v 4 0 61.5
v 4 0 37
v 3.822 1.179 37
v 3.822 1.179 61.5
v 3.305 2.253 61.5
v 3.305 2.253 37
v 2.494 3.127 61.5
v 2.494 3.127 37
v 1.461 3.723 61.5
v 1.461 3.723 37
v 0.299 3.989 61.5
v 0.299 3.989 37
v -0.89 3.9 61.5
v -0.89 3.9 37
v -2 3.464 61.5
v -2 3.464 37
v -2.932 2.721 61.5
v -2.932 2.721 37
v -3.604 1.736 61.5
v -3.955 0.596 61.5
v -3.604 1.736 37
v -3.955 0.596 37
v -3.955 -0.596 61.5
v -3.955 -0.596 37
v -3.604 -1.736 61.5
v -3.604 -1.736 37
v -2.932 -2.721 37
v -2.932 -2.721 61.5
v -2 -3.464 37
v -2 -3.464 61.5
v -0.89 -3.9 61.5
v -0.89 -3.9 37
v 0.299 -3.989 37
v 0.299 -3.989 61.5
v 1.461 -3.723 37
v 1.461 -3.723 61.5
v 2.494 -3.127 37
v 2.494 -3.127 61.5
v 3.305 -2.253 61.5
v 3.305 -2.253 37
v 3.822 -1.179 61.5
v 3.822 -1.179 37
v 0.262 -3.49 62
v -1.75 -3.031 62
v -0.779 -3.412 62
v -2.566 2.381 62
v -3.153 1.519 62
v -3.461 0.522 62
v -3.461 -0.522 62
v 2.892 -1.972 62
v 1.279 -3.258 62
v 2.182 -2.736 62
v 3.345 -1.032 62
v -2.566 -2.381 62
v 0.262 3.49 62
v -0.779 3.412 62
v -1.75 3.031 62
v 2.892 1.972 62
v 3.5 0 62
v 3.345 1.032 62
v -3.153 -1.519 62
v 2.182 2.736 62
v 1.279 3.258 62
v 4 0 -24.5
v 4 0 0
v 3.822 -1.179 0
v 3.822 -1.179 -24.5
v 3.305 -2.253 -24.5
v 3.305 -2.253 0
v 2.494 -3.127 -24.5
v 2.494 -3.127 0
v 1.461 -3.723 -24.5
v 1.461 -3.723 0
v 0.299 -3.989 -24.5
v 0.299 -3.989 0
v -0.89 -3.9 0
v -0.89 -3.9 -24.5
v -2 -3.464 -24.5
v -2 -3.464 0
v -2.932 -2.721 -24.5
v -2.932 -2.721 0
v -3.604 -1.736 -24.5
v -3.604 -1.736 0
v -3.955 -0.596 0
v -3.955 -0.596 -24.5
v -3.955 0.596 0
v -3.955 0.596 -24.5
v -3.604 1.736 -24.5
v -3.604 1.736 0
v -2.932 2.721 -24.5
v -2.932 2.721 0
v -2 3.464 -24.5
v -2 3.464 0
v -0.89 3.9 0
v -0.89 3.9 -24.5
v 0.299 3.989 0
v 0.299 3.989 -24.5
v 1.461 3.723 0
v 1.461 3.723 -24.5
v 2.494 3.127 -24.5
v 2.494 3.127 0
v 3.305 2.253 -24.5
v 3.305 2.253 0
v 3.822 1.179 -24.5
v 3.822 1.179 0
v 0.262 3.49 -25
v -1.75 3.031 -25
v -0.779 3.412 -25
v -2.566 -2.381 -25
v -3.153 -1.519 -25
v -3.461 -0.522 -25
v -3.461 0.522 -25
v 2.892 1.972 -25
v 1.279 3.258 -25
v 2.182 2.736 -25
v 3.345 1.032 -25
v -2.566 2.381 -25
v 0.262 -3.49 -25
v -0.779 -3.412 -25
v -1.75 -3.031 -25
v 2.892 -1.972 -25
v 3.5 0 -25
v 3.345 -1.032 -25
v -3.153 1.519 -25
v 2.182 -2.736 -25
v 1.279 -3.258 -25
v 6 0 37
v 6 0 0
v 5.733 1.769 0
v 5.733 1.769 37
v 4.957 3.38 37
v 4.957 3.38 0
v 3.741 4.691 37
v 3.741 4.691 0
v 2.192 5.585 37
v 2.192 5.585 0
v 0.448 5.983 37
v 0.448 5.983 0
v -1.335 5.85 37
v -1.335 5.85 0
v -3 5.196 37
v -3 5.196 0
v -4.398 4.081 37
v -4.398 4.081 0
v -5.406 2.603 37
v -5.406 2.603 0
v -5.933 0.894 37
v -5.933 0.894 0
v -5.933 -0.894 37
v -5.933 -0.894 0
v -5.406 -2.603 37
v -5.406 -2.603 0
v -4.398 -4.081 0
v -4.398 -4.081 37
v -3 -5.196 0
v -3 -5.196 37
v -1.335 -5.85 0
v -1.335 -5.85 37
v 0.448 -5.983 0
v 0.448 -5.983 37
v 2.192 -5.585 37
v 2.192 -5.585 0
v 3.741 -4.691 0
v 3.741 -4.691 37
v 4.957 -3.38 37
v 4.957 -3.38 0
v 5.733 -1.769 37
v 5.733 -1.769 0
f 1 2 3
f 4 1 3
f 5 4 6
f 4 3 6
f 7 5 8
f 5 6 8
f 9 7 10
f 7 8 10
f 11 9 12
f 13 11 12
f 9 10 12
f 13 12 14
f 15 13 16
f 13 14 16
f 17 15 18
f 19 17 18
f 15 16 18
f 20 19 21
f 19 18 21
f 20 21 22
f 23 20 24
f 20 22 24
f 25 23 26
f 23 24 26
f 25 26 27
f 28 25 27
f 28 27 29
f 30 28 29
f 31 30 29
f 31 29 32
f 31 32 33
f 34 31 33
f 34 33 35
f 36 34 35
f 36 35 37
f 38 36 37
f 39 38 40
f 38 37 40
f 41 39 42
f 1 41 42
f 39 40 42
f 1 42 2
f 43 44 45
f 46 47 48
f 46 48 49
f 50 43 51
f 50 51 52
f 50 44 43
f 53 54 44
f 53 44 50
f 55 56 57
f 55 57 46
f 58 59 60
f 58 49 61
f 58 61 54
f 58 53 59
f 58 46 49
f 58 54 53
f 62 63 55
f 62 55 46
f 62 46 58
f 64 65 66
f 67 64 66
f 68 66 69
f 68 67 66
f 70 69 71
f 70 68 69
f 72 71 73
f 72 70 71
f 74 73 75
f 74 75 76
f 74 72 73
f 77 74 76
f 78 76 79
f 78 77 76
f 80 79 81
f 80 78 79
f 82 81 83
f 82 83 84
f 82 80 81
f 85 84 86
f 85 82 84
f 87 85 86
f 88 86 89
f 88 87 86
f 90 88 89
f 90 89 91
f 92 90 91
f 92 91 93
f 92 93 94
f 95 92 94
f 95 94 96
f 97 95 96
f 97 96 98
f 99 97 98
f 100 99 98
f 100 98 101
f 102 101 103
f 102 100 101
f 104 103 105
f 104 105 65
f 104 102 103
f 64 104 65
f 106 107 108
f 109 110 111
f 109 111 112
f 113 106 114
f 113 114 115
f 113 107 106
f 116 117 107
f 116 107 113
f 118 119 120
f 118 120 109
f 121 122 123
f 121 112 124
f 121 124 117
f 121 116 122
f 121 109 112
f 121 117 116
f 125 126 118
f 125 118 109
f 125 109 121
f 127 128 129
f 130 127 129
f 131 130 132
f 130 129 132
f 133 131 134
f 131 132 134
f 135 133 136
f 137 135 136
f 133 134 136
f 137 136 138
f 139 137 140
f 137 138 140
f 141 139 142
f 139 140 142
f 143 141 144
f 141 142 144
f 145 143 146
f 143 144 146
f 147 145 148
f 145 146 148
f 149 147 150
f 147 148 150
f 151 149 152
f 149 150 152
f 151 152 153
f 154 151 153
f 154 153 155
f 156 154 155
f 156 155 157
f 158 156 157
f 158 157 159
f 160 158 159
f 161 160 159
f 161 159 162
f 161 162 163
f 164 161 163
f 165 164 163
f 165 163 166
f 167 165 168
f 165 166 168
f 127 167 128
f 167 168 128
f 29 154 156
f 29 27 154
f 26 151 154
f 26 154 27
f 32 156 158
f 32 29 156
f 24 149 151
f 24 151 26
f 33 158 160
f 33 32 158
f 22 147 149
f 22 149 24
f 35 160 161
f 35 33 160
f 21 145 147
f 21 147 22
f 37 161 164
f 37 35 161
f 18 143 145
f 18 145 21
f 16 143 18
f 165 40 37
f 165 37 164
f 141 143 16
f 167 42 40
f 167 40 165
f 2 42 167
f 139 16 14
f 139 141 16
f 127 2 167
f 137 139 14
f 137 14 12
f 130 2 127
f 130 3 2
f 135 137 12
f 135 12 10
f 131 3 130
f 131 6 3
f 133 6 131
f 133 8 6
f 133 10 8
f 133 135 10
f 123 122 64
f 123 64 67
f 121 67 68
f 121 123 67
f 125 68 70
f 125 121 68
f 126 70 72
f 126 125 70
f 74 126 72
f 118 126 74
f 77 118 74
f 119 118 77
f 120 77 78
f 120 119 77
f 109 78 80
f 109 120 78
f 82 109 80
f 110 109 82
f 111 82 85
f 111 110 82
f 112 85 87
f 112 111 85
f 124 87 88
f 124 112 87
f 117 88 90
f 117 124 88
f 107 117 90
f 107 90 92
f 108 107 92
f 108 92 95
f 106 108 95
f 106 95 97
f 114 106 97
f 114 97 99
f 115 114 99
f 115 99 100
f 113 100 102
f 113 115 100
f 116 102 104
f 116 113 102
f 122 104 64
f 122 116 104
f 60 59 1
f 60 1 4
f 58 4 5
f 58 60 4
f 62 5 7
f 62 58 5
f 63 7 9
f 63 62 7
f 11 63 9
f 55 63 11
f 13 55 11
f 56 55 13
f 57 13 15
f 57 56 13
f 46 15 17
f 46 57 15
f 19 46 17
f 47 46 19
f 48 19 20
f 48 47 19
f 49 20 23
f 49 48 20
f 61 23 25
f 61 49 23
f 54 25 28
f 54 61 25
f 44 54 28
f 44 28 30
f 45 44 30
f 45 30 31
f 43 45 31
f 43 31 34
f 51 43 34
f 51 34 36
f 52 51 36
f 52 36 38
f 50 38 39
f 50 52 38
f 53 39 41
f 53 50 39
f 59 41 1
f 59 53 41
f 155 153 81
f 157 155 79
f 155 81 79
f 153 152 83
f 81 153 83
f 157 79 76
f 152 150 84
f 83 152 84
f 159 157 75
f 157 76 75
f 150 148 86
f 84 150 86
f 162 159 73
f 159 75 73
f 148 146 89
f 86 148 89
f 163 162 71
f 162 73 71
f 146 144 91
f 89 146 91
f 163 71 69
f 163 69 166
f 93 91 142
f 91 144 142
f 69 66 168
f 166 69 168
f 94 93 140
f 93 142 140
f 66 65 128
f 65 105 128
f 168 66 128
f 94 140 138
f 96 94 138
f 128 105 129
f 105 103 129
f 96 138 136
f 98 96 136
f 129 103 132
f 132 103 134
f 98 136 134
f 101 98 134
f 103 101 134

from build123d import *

# Parameters (mm, degrees)
SCHIZZO1_R        = 6
ESTRUSIONE1_DEPTH = 37
SCHIZZO3_R        = 4
ESTRUSIONE2_DEPTH = 25
ESTRUSIONE3_START = 25
SCHIZZO4_R        = 4
ESTRUSIONE3_DEPTH = 25
SMUSSO1_SIZE      = 0.5


with BuildPart() as part:
    # Schizzo1 → Estrusione1 (new body)
    with BuildSketch(Plane.XY):
        Circle(SCHIZZO1_R)
    extrude(amount=ESTRUSIONE1_DEPTH)

    # Schizzo3 → Estrusione2 (add)
    with BuildSketch(Plane.XY.offset(37)):
        Circle(SCHIZZO3_R)
    extrude(amount=ESTRUSIONE2_DEPTH)

    # Schizzo4 → Estrusione3 (add)
    with BuildSketch(Plane(origin=(0, 0, 0), x_dir=(-1, 0, 0), z_dir=(0, 0, -1)).offset(ESTRUSIONE3_START)):
        with Locations(Location((0, 0, 0), (0, 0, 180))):
            Circle(SCHIZZO4_R)
    extrude(amount=-ESTRUSIONE3_DEPTH)

    # Smusso1
    smusso1_edges = [part.edges().sort_by_distance(p)[0] for p in [
        (-4, 0, -25),
        (-4, 0, 62),
    ]]
    chamfer(smusso1_edges, length=SMUSSO1_SIZE)


solid = part.part
